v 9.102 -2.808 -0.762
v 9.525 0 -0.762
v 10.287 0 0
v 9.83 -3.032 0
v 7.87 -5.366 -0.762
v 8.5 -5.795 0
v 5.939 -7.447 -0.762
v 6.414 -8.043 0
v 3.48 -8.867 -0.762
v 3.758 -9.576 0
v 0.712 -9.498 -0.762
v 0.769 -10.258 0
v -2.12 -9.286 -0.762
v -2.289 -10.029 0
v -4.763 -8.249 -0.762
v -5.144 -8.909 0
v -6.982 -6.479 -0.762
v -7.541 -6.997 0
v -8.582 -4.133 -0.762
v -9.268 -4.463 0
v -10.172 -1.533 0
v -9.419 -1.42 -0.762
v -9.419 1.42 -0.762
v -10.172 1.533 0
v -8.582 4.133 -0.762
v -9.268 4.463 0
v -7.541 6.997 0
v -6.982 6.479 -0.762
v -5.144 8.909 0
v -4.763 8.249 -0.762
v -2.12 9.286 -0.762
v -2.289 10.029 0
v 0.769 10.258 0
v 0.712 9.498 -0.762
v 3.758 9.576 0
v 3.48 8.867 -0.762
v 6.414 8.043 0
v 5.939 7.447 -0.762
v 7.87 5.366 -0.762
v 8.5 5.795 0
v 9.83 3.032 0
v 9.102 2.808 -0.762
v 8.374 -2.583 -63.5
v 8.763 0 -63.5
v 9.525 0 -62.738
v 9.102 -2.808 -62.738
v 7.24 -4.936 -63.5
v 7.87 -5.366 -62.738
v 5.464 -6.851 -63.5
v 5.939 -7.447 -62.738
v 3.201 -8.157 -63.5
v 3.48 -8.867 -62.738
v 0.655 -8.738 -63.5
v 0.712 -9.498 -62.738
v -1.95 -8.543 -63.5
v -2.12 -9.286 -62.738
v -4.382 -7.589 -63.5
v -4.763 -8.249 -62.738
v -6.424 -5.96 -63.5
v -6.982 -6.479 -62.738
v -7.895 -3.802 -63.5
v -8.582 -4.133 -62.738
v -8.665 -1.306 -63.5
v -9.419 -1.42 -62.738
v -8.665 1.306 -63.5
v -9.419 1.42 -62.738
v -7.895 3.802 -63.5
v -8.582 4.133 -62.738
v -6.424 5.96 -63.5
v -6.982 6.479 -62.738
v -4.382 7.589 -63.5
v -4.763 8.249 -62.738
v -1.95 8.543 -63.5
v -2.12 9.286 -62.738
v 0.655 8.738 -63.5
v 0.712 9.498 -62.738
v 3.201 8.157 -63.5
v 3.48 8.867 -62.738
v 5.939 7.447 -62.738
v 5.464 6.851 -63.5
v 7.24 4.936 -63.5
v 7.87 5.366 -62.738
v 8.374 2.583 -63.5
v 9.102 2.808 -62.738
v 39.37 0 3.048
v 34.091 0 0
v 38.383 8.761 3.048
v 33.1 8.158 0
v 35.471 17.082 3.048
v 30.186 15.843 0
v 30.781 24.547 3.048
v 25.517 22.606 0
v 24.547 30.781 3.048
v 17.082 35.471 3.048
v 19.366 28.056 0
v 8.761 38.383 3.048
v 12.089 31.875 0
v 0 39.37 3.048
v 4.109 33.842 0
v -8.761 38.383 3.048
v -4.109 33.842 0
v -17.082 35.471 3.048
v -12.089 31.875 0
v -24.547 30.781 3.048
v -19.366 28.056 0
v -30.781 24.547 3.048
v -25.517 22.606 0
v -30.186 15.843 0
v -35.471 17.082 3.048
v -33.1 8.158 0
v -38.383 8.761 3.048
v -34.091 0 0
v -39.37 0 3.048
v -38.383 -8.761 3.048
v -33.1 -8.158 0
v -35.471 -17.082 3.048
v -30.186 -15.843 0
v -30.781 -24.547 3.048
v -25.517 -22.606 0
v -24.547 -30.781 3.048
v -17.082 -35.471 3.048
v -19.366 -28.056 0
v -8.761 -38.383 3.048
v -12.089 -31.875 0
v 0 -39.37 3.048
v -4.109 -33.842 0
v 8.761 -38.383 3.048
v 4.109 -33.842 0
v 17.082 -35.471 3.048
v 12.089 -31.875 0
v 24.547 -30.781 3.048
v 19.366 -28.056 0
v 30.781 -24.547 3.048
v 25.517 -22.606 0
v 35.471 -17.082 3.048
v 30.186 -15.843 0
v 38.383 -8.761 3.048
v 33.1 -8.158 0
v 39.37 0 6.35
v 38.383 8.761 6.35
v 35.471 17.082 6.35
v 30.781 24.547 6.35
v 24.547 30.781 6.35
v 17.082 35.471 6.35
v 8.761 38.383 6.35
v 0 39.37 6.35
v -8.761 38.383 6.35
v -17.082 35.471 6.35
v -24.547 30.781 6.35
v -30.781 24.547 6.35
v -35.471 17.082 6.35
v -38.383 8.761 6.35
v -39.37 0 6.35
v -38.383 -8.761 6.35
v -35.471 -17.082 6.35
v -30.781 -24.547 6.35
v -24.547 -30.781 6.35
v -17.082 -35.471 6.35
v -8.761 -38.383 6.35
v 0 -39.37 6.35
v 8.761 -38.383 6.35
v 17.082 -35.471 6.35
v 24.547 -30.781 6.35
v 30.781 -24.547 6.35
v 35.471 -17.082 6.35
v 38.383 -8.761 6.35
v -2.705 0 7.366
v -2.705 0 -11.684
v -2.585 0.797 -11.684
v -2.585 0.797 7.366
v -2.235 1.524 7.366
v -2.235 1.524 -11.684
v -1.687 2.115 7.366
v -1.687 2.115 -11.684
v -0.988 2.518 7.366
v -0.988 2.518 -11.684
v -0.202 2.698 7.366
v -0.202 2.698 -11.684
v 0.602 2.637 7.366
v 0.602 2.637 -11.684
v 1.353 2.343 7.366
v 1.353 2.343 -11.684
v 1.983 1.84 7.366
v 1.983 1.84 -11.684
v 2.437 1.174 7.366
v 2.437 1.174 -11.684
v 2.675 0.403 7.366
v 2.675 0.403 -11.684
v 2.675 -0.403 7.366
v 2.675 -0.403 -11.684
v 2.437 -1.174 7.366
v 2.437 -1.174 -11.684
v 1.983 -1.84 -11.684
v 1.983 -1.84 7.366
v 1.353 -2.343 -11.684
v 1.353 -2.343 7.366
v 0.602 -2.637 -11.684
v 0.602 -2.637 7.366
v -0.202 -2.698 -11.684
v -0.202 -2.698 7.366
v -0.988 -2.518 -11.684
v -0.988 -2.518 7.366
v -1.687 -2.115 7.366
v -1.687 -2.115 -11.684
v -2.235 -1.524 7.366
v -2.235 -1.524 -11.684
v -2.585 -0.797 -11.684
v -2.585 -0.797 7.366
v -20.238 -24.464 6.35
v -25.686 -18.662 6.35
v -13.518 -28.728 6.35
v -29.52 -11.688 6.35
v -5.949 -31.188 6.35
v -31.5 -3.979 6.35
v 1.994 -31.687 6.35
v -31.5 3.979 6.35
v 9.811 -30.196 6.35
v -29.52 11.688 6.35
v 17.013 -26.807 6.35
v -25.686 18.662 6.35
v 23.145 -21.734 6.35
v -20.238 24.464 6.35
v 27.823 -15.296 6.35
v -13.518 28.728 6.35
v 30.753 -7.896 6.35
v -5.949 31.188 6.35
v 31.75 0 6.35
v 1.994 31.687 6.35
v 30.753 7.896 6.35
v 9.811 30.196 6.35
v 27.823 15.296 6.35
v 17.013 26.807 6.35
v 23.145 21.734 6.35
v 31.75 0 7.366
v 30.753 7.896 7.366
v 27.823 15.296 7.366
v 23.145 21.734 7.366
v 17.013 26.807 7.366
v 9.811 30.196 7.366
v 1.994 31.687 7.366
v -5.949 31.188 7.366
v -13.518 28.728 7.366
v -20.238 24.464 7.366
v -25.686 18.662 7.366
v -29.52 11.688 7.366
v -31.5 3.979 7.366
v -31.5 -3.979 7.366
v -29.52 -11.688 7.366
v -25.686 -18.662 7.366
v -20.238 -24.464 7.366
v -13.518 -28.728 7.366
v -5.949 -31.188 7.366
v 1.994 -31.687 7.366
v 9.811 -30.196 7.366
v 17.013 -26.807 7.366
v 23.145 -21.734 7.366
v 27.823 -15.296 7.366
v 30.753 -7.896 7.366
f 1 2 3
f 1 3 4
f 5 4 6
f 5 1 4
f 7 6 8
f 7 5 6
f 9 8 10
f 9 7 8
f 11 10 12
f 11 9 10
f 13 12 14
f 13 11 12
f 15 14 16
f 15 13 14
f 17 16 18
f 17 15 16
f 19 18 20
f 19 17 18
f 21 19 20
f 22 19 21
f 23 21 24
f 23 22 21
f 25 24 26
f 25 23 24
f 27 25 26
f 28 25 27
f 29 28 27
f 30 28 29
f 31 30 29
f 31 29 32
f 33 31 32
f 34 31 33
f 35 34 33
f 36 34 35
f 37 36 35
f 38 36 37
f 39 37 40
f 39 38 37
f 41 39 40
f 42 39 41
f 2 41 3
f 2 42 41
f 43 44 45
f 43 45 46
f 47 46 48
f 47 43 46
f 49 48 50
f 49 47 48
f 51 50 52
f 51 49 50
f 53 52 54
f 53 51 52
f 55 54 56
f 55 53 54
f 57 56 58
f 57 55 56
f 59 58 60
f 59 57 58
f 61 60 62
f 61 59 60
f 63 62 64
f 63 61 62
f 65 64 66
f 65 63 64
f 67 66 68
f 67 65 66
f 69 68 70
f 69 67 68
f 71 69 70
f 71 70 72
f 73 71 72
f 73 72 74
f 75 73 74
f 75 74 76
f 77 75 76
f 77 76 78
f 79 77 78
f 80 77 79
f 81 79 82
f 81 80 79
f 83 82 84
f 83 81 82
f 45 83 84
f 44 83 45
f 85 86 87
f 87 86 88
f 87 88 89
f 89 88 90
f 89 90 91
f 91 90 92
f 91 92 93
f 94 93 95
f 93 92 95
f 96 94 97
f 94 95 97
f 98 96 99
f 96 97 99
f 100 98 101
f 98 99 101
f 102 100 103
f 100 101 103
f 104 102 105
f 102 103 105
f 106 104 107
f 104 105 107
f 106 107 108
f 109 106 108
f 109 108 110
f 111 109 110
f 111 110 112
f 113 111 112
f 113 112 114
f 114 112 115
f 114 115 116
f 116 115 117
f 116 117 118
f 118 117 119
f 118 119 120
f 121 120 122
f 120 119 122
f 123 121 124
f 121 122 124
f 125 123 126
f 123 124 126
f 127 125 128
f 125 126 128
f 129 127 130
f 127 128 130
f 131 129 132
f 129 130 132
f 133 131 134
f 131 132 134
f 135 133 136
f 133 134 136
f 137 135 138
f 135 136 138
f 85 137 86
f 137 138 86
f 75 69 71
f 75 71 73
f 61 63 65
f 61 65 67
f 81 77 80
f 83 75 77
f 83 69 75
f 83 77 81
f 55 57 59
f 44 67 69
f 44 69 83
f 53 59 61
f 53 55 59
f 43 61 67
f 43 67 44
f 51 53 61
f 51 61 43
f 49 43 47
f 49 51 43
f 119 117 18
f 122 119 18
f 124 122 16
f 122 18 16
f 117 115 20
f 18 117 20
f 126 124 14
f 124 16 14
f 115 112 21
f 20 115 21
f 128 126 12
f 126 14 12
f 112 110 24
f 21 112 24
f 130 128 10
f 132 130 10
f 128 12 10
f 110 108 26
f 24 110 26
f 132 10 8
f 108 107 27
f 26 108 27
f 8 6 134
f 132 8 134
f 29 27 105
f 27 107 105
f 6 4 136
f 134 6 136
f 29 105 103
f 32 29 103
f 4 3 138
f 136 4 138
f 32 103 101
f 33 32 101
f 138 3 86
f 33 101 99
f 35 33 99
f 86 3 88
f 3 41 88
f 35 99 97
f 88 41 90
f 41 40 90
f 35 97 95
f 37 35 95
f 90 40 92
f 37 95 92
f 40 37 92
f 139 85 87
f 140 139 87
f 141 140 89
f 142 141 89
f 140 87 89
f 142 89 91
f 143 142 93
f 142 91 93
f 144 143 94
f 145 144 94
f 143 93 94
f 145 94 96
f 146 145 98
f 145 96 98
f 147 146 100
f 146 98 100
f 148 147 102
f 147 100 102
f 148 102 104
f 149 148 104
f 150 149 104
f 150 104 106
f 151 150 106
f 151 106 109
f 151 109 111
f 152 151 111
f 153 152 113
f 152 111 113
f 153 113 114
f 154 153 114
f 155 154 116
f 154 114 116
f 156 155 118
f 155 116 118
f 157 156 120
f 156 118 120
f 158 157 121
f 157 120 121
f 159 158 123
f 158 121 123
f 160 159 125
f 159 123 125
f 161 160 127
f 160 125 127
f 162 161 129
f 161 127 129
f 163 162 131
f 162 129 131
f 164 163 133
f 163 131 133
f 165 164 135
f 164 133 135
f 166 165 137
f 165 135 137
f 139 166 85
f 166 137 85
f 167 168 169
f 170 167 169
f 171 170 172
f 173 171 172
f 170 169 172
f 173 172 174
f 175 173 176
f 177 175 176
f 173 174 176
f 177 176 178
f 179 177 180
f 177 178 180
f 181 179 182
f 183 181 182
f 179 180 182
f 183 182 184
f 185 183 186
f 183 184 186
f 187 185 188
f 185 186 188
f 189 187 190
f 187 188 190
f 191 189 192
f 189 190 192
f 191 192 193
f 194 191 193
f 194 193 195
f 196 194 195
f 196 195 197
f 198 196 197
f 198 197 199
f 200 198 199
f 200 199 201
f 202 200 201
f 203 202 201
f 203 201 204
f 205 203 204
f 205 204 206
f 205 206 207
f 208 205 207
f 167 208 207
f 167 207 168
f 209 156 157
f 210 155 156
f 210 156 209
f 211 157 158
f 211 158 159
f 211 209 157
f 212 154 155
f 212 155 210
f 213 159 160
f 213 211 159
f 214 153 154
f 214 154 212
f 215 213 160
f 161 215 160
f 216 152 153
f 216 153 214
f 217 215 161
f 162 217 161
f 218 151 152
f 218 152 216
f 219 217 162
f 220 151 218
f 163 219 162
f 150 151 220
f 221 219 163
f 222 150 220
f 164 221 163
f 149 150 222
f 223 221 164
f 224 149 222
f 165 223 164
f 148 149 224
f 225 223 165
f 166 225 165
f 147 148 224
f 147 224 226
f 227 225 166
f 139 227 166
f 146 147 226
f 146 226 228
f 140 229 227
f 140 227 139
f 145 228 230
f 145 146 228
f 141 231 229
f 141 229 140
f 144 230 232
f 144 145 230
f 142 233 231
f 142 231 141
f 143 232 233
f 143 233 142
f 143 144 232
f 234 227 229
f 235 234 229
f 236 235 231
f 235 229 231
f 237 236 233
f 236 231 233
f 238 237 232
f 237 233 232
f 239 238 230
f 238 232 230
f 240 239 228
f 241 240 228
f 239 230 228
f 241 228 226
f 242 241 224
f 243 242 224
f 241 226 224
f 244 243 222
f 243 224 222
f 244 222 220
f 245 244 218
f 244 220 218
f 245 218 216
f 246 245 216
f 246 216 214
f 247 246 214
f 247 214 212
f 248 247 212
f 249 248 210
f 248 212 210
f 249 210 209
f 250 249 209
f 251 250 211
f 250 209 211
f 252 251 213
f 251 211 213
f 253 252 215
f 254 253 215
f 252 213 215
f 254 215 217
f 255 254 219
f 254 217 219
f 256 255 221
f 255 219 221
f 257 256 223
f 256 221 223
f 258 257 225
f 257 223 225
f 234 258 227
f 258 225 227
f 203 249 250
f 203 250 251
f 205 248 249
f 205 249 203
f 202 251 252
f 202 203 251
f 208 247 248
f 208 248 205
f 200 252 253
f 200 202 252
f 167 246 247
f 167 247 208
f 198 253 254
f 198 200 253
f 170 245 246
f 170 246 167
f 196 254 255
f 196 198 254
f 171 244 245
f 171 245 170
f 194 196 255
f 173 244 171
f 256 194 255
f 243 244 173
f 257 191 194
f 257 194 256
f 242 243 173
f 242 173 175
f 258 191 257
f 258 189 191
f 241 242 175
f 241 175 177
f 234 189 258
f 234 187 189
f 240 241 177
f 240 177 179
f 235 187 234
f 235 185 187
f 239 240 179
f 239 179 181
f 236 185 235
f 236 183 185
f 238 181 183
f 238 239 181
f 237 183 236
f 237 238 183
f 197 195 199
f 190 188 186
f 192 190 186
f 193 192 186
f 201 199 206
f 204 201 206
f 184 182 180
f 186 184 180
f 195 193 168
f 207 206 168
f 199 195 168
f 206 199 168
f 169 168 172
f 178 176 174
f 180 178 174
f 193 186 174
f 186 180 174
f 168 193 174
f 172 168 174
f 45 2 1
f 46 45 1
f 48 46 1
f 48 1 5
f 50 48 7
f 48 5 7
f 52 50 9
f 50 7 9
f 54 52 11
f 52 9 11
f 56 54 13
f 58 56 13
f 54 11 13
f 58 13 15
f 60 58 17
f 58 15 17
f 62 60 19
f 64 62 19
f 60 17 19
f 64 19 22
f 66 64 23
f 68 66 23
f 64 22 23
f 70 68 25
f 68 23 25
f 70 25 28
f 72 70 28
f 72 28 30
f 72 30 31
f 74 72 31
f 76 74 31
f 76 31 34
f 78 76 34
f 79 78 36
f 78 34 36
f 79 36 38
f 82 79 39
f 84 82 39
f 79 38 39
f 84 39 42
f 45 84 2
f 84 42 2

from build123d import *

# Parameters (mm, degrees)
SKETCH1_R                   = 39.37
BASE_EXTRUDE_DEPTH          = 6.35
SKETCH2_R                   = 31.75
BOSS_EXTRUDE1_DEPTH         = 1.016
SKETCH3_R                   = 9.525
BOSS_EXTRUDE2_DEPTH         = 63.5
CHAMFER1_SIZE               = 0.762
F_1_4_28_TAPPED_HOLE1_D     = 5.4102
F_1_4_28_TAPPED_HOLE1_DEPTH = 19.05
CHAMFER2_SIZE               = 3.048
CHAMFER2_SIZE2              = 5.279290861


with BuildPart() as part:
    # Sketch1 → Base-Extrude (new body)
    with BuildSketch(Plane.XY):
        Circle(SKETCH1_R)
    extrude(amount=BASE_EXTRUDE_DEPTH)

    # Sketch2 → Boss-Extrude1 (add)
    with BuildSketch(Plane.XY.offset(6.35)):
        Circle(SKETCH2_R)
    extrude(amount=BOSS_EXTRUDE1_DEPTH)

    # Sketch3 → Boss-Extrude2 (add)
    with BuildSketch(Plane(origin=(0, 0, 0), x_dir=(-1, 0, 0), z_dir=(0, 0, -1))):
        with Locations(Location((0, 0, 0), (0, 0, 180))):
            Circle(SKETCH3_R)
    extrude(amount=BOSS_EXTRUDE2_DEPTH)

    # Chamfer1
    chamfer1_edges = [part.edges().sort_by_distance(p)[0] for p in [
        (-9.525, 0, 0),
        (-9.525, 0, -63.5),
    ]]
    chamfer(chamfer1_edges, length=CHAMFER1_SIZE)

    # 1/4-28 Tapped Hole1
    with Locations(Plane.XY.offset(7.366)):
        with Locations((0, 0)):
            Hole(F_1_4_28_TAPPED_HOLE1_D / 2, depth=F_1_4_28_TAPPED_HOLE1_DEPTH)

    # Chamfer2
    chamfer2_edges = [part.edges().sort_by_distance(p)[0] for p in [
        (-39.37, 0, 0),
    ]]
    chamfer2_side = [part.faces().sort_by_distance(p)[0] for p in [
        (-39.37, 0, 3.175),
    ]]
    chamfer(chamfer2_edges, length=CHAMFER2_SIZE, length2=CHAMFER2_SIZE2, reference=chamfer2_side[0])


solid = part.part
